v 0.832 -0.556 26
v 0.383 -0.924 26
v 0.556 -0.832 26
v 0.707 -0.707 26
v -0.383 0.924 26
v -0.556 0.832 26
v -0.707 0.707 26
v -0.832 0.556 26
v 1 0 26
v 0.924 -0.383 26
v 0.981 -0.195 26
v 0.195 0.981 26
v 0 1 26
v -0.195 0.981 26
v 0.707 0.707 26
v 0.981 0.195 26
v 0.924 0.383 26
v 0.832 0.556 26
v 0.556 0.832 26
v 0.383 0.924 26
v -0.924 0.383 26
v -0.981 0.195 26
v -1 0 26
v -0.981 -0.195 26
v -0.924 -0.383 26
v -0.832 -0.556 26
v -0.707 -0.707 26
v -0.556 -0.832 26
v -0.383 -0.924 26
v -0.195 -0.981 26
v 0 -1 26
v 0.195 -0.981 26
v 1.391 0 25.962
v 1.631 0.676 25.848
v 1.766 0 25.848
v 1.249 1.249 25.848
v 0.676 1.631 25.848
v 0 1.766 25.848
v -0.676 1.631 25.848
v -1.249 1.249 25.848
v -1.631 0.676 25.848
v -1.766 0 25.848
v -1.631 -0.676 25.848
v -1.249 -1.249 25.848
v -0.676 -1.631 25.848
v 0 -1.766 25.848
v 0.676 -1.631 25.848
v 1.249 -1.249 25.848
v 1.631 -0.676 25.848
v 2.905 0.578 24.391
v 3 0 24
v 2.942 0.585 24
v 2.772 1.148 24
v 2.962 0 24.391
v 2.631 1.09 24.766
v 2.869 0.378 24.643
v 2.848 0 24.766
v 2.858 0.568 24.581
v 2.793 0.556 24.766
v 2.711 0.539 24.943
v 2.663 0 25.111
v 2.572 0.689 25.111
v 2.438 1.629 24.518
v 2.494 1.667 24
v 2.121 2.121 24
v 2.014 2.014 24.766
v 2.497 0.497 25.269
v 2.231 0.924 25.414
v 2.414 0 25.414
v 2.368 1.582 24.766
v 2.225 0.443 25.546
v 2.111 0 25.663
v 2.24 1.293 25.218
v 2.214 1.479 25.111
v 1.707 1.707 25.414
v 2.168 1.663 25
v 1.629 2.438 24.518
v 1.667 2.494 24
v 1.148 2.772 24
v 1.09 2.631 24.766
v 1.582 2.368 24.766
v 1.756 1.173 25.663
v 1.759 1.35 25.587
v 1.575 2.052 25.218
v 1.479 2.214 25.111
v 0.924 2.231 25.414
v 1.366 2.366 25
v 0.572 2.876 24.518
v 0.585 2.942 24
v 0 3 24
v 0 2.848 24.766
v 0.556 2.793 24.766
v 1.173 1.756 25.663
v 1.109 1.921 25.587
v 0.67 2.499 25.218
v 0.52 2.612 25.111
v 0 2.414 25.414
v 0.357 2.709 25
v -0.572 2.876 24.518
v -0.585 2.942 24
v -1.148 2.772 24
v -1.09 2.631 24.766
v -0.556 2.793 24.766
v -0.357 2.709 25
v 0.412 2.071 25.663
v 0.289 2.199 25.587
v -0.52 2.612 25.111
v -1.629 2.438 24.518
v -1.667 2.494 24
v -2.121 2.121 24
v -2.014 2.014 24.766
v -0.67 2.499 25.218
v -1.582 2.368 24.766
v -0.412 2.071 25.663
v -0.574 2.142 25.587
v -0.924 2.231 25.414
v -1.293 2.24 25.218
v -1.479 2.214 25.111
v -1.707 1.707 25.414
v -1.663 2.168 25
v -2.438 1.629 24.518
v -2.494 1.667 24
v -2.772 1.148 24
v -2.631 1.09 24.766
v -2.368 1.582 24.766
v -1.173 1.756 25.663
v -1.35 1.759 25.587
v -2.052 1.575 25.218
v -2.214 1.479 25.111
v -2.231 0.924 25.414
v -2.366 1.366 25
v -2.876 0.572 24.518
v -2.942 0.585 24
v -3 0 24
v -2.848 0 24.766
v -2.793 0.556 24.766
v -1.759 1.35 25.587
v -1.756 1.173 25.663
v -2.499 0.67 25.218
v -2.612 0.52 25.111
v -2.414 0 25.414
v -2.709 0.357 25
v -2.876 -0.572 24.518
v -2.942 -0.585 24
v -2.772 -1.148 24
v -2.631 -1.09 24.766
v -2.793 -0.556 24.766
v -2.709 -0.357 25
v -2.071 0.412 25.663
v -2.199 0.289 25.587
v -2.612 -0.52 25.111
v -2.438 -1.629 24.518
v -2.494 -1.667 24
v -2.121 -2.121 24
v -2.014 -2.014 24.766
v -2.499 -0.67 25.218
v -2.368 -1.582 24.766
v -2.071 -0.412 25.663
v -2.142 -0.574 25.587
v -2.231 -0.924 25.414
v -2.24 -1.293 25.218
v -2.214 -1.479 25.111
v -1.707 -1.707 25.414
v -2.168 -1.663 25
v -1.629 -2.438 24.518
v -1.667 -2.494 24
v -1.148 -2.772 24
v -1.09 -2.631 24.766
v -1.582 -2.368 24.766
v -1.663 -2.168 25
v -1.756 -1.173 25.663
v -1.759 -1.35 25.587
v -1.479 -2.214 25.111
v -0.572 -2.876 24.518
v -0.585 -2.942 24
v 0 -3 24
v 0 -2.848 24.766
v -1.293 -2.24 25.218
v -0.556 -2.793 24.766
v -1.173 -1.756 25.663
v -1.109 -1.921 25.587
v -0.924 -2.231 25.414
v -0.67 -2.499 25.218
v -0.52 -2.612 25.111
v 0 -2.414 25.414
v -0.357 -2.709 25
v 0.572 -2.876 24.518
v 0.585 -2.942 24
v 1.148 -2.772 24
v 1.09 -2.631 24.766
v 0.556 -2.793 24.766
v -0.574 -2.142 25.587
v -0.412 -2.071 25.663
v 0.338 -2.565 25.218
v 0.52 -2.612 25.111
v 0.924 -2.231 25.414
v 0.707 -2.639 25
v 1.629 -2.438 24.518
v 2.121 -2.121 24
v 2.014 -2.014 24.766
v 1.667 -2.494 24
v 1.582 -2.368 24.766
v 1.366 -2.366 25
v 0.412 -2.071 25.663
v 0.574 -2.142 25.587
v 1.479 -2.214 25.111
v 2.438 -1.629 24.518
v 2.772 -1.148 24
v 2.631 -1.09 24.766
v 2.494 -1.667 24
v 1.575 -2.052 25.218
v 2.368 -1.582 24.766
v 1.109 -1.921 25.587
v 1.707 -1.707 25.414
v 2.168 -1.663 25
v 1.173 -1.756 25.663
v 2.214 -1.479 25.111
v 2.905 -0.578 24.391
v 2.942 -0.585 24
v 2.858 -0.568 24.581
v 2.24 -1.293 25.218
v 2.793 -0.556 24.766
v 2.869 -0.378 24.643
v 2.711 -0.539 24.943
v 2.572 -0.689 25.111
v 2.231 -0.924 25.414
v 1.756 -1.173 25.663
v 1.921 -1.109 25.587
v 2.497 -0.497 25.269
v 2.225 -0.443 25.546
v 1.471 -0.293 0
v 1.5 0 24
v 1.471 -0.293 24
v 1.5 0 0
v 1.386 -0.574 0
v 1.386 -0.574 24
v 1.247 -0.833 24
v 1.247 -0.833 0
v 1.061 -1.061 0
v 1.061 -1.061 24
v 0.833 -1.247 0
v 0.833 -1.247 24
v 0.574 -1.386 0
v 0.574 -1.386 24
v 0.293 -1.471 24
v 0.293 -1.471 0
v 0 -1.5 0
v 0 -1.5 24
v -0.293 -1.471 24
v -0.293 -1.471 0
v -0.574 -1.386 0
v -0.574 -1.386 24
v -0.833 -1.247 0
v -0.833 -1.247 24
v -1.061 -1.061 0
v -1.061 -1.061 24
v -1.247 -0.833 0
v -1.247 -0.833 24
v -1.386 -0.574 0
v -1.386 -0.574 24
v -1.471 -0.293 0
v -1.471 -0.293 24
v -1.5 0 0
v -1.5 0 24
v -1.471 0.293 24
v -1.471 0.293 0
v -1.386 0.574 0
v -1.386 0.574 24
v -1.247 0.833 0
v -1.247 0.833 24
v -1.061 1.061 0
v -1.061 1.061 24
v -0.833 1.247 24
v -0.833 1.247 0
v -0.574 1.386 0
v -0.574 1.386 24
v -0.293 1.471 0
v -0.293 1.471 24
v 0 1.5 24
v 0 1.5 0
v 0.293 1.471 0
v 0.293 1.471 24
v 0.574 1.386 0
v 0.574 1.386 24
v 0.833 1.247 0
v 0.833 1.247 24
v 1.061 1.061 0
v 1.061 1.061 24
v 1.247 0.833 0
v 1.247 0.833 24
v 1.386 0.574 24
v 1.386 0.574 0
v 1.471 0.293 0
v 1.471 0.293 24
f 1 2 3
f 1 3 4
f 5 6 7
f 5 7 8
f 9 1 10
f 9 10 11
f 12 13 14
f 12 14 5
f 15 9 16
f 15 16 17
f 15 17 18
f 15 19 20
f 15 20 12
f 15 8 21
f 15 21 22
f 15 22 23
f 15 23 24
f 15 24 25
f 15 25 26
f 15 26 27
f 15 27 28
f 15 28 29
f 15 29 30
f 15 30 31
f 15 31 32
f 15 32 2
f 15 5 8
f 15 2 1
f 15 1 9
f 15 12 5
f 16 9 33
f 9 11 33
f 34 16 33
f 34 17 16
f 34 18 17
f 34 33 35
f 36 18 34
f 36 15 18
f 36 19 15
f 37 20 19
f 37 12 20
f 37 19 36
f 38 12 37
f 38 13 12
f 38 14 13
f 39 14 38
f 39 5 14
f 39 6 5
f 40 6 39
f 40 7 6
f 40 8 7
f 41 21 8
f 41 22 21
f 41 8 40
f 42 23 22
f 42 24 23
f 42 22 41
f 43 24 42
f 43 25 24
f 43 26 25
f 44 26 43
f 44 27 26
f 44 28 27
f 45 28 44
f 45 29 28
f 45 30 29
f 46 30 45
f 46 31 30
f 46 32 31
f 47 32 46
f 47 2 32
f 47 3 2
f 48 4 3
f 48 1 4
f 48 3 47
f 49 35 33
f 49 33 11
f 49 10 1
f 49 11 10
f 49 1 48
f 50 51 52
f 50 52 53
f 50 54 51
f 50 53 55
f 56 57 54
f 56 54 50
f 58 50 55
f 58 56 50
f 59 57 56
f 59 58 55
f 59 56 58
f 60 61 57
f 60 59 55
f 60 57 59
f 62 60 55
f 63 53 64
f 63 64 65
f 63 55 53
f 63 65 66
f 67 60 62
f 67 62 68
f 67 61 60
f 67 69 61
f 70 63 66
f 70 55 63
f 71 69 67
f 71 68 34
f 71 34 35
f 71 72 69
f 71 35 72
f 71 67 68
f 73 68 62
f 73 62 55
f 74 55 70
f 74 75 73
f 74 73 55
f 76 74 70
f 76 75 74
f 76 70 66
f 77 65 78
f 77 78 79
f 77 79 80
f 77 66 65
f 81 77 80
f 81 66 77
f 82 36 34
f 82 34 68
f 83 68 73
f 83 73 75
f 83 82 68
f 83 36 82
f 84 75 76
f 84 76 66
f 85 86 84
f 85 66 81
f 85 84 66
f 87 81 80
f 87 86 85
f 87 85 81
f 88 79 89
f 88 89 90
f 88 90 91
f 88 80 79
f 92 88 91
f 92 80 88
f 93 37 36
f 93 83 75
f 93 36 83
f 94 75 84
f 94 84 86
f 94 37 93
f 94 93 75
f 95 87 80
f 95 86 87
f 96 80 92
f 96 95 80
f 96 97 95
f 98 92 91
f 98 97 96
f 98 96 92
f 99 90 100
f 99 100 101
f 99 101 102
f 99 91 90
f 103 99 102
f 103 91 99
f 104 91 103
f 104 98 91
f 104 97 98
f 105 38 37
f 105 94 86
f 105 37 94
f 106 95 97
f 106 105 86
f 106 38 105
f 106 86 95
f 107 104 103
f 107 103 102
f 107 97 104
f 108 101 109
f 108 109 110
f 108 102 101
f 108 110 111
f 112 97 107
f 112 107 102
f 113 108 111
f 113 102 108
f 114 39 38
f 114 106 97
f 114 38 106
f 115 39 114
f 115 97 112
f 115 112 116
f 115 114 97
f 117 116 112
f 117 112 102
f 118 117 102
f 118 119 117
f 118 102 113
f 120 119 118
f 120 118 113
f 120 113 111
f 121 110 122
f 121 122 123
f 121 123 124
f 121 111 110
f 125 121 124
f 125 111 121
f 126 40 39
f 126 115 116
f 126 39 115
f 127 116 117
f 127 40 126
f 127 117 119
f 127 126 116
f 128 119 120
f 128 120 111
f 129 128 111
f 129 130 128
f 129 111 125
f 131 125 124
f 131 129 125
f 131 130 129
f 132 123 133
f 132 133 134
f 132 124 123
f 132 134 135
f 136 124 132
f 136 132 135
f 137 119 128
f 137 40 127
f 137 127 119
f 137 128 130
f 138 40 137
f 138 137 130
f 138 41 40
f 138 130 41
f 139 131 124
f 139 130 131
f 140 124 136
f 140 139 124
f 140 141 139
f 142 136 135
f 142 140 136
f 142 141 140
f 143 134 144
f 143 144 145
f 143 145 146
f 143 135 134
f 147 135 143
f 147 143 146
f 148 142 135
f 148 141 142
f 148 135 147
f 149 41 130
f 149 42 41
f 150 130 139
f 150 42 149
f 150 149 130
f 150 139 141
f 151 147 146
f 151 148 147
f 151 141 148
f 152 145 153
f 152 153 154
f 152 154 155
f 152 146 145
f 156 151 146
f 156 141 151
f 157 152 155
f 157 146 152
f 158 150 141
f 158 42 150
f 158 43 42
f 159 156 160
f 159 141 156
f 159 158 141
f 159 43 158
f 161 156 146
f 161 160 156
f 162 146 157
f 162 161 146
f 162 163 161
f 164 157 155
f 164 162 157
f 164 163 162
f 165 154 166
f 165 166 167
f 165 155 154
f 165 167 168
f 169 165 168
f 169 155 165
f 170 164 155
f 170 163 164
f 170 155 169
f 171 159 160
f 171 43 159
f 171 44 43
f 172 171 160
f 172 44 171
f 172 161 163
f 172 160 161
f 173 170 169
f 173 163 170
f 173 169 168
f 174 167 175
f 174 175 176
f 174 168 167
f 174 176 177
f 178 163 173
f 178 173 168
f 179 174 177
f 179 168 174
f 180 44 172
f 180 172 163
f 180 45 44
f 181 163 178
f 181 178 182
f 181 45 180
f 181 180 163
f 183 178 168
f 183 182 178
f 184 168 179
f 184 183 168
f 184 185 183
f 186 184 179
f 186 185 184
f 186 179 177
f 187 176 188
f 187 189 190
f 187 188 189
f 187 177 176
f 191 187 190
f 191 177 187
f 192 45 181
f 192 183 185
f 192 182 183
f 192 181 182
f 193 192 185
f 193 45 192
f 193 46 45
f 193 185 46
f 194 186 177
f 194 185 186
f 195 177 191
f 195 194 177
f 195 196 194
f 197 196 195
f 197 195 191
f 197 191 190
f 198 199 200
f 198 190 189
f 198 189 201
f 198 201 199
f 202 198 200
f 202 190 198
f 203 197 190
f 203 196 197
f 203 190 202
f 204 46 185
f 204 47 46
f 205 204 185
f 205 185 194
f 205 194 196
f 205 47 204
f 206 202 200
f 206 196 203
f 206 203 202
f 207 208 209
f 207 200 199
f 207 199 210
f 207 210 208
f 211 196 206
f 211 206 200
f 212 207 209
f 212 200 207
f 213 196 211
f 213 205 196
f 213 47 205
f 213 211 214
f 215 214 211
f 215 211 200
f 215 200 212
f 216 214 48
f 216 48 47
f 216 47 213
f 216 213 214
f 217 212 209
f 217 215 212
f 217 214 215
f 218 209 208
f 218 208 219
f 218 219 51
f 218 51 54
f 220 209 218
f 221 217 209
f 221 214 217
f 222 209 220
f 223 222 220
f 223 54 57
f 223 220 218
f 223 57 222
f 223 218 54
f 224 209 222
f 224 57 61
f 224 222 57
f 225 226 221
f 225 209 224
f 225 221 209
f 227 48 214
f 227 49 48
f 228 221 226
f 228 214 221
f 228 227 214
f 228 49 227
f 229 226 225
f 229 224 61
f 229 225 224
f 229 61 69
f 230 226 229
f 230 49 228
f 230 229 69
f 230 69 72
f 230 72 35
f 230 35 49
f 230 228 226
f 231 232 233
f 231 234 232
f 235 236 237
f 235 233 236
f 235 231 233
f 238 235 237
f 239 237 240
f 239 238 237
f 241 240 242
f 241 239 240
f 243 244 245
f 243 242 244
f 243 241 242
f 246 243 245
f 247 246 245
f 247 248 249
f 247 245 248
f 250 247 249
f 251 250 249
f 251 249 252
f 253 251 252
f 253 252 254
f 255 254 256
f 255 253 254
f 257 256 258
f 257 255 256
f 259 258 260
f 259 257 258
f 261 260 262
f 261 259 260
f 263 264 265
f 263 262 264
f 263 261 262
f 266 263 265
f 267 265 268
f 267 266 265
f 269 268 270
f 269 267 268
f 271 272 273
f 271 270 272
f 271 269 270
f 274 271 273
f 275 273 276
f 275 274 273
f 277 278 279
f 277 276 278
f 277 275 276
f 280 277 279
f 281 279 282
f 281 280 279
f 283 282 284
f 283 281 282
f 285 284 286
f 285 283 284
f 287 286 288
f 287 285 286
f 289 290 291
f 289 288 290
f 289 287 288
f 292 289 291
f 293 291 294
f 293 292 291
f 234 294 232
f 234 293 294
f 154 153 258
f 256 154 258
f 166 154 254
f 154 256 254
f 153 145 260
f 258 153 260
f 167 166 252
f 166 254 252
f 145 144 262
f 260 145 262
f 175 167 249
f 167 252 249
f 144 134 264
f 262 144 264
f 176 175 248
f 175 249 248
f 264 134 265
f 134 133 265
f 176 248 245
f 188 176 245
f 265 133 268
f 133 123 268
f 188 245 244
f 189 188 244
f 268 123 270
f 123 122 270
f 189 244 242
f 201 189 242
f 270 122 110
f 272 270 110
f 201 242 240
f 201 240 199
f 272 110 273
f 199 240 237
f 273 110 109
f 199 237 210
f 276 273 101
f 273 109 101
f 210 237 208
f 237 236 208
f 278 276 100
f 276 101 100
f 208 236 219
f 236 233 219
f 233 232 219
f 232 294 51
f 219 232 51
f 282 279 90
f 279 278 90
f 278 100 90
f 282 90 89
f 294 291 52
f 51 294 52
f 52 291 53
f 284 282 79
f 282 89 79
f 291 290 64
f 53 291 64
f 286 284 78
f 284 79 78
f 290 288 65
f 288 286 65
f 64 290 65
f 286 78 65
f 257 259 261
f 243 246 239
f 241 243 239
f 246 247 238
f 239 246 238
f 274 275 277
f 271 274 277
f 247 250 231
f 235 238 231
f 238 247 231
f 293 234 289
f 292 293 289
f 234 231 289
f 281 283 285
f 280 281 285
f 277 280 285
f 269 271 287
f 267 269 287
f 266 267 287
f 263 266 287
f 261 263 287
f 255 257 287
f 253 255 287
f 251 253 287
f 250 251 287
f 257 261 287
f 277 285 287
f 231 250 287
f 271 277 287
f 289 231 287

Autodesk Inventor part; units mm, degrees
ref_plane "YZ Plane" through (0, 0, 0) normal (1, 0, 0) x (0, 1, 0)
ref_plane "XZ Plane" through (0, 0, 0) normal (0, 1, 0) x (-1, 0, 0)
ref_plane "XY Plane" through (0, 0, 0) normal (0, 0, 1) x (1, 0, 0)
sketch "スケッチ1" plane through (0, 0, 0) normal (0, 0, 1) x (1, 0, 0)
  circle A0 centre (0, 0) radius 1.5
  dimension "d0" = 3
extrude "押し出し1" add sketch "スケッチ1" along normal blind 24
sketch "スケッチ2" plane through (0, 0, 24) normal (0, 0, 1) x (1, 0, 0)
  circle A0 centre (0, 0) radius 1.5 projected
  circle A1 centre (0, 0) radius 3
  dimension "d3" = 6
extrude "押し出し2" add sketch "スケッチ2" along normal blind 2 contours A0 | A1
fillet "フィレット1" radius 2 1 edges at (-3, 0, 26)
properties part number "M3ボタンボルト15" material "鋼、高強度、低合金"
